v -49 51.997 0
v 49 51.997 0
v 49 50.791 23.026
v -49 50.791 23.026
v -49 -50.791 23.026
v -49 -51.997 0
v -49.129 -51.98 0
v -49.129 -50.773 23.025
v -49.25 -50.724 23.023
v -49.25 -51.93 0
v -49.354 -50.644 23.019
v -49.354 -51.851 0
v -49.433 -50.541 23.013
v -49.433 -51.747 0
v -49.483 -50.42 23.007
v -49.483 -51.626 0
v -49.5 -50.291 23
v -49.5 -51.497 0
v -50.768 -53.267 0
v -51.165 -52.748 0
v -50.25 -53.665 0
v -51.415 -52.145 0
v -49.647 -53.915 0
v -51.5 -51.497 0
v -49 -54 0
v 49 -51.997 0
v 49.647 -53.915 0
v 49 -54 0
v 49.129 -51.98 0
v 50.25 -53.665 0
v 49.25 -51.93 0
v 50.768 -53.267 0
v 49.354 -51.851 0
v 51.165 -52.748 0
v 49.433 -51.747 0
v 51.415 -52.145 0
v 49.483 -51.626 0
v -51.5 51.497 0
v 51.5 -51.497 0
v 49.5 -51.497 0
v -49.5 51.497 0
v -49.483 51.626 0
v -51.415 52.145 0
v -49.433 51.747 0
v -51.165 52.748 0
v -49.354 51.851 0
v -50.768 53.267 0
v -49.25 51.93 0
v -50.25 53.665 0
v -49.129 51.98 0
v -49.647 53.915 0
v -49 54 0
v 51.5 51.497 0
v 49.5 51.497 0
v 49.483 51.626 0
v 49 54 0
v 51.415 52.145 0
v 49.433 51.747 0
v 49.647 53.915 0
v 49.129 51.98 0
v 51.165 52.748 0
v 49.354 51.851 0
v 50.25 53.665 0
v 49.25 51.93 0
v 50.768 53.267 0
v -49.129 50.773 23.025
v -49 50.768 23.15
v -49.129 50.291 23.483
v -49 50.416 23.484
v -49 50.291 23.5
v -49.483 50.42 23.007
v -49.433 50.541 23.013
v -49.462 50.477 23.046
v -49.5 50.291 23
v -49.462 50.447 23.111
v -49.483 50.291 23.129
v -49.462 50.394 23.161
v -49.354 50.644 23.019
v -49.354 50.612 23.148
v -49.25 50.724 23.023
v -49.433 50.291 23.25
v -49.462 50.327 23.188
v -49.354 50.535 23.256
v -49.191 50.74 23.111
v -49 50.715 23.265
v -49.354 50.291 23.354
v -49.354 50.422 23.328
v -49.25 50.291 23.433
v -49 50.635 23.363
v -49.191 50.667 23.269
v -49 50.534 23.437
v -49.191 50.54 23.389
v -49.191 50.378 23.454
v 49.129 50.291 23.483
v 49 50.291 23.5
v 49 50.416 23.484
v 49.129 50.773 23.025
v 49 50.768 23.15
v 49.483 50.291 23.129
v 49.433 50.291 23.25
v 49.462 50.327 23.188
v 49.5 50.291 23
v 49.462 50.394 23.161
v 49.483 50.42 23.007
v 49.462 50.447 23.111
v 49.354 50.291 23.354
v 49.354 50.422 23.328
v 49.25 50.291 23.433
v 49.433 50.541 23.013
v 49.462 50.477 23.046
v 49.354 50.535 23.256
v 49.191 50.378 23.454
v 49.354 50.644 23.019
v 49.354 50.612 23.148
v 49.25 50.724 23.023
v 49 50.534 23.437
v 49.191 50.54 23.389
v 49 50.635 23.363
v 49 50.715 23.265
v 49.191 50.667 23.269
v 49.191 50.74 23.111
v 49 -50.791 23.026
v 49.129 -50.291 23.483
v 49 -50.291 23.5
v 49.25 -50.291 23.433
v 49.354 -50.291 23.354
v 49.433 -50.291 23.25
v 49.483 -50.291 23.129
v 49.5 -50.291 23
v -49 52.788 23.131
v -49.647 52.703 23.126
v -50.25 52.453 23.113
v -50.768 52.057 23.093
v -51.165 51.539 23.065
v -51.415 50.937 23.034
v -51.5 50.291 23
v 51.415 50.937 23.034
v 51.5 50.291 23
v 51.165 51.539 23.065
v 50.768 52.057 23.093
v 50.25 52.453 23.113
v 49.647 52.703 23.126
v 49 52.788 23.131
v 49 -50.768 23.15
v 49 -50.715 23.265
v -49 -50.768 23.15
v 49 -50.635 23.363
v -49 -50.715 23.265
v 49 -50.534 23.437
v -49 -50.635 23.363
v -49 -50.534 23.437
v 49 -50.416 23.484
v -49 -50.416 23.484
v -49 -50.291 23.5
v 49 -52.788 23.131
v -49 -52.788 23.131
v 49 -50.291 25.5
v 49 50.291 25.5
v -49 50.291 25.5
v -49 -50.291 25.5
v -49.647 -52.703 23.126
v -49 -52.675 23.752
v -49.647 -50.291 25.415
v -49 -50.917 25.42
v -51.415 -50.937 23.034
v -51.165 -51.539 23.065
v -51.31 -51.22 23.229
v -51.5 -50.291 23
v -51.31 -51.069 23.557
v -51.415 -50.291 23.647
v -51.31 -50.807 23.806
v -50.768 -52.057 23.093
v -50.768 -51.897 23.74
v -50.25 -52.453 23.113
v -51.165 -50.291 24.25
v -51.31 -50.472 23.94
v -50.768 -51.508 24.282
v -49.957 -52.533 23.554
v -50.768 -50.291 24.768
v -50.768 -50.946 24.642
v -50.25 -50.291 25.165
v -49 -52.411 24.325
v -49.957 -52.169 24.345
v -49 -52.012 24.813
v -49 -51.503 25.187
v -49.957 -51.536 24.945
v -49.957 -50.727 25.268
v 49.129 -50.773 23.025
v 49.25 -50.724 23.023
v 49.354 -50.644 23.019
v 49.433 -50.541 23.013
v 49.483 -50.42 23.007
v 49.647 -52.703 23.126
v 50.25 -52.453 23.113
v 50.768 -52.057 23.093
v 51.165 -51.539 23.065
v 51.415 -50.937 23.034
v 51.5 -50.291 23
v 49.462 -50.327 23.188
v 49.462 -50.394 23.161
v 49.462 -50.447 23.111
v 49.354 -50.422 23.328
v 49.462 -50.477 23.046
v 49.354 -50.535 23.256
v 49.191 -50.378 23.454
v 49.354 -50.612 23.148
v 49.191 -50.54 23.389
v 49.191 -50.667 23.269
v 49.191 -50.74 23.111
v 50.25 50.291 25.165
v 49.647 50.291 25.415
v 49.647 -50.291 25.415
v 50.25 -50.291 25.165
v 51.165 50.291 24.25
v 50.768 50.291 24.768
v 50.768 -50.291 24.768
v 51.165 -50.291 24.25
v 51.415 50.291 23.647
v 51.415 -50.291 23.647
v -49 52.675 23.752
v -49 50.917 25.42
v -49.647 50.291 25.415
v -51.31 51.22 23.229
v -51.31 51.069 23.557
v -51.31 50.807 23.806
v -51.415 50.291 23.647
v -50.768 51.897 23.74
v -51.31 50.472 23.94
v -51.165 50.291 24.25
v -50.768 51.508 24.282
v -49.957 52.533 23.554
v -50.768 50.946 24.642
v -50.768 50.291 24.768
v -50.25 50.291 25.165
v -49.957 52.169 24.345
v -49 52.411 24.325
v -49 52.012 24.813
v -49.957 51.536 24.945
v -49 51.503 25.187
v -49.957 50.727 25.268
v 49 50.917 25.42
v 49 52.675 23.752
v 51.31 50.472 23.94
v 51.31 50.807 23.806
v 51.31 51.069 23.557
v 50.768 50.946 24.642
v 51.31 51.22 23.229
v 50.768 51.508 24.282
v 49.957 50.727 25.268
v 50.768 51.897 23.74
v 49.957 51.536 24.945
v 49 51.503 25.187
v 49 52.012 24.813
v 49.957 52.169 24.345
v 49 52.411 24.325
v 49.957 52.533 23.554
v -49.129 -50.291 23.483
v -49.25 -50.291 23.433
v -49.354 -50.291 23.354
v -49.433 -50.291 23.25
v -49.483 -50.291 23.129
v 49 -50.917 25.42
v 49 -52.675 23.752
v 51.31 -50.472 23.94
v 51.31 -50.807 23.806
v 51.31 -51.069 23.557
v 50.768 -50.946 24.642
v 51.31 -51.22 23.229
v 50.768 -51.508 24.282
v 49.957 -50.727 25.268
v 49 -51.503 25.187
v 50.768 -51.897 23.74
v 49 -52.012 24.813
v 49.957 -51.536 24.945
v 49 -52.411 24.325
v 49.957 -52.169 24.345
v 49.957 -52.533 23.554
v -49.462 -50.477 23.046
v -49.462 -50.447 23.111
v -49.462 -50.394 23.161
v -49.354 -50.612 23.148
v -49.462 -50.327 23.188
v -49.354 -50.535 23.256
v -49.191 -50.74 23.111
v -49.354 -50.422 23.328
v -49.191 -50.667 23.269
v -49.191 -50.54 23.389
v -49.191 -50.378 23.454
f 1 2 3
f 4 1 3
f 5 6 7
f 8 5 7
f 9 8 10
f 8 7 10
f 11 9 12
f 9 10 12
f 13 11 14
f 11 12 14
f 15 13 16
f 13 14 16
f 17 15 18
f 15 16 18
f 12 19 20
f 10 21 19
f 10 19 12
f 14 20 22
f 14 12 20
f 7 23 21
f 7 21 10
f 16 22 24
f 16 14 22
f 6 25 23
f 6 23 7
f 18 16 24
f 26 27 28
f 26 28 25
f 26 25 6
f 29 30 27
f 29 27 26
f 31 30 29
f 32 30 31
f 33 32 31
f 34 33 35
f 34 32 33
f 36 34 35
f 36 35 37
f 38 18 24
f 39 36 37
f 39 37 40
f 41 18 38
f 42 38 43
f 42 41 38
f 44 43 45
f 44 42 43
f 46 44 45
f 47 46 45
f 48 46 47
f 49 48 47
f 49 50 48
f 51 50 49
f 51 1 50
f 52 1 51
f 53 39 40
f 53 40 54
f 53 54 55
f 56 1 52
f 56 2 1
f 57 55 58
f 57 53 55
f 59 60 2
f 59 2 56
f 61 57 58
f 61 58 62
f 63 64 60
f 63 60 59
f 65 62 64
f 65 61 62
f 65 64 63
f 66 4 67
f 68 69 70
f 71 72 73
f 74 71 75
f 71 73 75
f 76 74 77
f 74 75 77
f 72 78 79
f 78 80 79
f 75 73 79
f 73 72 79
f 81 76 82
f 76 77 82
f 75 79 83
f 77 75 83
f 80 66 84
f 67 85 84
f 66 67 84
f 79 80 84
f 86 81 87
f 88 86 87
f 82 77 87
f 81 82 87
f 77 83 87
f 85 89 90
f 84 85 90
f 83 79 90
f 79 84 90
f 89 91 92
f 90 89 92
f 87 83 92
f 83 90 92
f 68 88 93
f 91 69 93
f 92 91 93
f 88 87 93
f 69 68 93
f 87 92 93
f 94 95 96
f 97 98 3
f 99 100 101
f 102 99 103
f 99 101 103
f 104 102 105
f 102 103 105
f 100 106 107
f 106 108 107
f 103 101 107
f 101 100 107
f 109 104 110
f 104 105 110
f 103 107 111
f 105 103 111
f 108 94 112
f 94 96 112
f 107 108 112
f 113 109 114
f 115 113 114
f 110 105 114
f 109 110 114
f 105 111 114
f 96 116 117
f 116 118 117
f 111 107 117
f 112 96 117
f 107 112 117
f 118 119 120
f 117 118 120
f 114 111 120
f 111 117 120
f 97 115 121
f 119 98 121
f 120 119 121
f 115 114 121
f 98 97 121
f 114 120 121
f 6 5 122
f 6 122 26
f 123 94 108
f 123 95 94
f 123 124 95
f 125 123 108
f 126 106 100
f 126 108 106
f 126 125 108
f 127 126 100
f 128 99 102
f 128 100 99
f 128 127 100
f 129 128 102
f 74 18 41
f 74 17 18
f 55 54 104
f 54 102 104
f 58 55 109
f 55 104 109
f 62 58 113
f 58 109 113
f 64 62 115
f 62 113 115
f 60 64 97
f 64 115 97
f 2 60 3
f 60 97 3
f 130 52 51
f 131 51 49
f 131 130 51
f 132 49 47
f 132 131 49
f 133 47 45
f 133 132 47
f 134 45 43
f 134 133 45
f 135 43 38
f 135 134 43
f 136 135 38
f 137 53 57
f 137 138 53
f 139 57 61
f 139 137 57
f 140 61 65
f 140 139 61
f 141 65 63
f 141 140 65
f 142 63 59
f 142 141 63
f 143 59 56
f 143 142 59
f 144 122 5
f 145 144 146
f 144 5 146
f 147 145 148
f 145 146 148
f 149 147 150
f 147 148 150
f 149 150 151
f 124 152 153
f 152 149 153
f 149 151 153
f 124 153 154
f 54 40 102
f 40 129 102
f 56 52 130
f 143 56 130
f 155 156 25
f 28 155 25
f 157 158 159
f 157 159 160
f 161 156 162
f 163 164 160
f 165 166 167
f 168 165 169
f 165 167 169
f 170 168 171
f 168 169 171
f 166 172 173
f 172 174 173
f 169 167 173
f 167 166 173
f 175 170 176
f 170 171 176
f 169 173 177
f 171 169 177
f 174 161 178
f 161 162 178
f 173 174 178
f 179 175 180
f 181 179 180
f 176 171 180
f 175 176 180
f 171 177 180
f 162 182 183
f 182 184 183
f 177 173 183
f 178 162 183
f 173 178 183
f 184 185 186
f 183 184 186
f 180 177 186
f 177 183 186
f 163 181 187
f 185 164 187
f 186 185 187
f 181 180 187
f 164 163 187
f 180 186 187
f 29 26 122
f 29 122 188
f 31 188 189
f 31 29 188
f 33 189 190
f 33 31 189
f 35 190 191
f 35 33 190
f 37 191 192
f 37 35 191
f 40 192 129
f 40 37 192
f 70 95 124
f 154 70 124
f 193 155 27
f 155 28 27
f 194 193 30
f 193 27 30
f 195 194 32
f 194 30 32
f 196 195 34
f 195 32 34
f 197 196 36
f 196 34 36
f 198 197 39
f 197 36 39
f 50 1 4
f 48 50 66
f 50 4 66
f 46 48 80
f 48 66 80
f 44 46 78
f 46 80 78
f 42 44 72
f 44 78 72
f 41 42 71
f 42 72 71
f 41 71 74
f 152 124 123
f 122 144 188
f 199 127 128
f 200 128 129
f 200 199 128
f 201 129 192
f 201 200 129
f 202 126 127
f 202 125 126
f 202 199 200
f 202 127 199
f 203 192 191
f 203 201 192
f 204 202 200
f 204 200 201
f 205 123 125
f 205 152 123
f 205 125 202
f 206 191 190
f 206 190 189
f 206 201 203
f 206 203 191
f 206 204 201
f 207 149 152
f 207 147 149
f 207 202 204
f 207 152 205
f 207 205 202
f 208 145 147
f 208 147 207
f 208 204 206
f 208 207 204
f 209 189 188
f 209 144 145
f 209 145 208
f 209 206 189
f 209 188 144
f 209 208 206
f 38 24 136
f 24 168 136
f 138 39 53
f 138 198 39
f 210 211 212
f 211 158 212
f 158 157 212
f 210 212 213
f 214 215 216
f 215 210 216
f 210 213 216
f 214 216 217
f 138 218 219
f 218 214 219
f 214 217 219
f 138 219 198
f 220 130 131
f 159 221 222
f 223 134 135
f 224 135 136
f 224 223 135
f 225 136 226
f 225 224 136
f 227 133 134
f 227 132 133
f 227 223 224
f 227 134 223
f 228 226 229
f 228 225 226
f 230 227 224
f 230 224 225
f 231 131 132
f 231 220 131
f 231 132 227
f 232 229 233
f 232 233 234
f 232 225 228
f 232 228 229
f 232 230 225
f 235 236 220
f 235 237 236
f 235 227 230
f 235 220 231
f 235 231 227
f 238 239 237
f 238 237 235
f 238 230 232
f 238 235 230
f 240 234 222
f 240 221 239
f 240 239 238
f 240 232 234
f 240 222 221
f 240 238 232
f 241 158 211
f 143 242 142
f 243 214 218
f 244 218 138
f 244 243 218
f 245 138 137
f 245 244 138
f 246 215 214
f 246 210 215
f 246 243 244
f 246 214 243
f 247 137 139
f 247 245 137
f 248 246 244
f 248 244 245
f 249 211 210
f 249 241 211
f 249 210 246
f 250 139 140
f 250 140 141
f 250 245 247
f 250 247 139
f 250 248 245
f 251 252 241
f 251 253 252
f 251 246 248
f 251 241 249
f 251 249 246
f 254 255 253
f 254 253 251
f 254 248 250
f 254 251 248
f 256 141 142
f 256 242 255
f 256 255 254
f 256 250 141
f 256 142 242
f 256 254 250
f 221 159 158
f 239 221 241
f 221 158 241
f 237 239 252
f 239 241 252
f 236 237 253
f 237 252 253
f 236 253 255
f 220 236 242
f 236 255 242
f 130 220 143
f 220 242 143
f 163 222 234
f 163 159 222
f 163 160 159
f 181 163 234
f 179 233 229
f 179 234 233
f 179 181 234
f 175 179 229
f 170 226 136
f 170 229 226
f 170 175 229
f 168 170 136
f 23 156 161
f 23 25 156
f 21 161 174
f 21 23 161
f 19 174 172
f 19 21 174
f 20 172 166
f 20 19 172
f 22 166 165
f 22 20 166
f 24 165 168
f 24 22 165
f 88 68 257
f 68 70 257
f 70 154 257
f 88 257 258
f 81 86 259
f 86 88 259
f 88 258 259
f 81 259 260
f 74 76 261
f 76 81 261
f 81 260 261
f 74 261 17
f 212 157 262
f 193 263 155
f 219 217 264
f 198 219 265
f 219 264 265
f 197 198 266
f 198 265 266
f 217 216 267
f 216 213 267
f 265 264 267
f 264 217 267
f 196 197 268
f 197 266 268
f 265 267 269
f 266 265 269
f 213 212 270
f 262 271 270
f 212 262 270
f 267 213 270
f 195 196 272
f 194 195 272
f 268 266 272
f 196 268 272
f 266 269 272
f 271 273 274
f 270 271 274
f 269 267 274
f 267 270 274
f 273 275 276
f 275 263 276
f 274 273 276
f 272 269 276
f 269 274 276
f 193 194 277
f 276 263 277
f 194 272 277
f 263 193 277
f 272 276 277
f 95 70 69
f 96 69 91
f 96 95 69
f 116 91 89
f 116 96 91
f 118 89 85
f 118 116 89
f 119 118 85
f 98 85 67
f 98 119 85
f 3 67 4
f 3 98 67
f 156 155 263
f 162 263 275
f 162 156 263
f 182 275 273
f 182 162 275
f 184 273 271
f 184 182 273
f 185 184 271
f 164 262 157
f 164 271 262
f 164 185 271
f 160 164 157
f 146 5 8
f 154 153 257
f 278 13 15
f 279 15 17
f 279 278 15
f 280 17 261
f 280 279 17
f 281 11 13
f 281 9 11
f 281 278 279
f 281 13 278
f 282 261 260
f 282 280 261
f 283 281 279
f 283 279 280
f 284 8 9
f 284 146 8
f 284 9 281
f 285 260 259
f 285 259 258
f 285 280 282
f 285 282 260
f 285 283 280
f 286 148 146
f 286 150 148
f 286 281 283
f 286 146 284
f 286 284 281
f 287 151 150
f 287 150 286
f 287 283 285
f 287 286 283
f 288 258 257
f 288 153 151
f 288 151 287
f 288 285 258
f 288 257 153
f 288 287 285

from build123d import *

# Parameters (mm, degrees)
F3_DEPTH      = 51.5
F3_DEPTH_BACK = 51.5
F4_R          = 2.5
F5_T          = -2


with BuildPart() as f3:
    # F2 (on Right) → F3 (new body, two sides)
    with BuildSketch(Plane.YZ) as f3_sk:
        Polygon((-54, 0), (54, 0), (52.6636016283, 25.5), (-52.6636016283, 25.5), align=None)
    extrude(amount=F3_DEPTH)
    extrude(f3_sk.sketch, amount=-F3_DEPTH_BACK)

    # F4
    f4_edges = [f3.edges().sort_by_distance(p)[0] for p in [
        (0, -52.663602, 25.5),
        (-51.5, -53.331801, 12.75),
        (-51.5, 0, 25.5),
        (51.5, 0, 25.5),
        (51.5, -53.331801, 12.75),
        (51.5, 53.331801, 12.75),
        (0, 52.663602, 25.5),
        (-51.5, 53.331801, 12.75),
    ]]
    fillet(f4_edges, radius=F4_R)

    # F5
    f5_openings = [f3.faces().sort_by_distance(p)[0] for p in [
        (0, 0, 0),
    ]]
    offset(amount=F5_T, openings=f5_openings, kind=Kind.INTERSECTION)


solid = f3.part
